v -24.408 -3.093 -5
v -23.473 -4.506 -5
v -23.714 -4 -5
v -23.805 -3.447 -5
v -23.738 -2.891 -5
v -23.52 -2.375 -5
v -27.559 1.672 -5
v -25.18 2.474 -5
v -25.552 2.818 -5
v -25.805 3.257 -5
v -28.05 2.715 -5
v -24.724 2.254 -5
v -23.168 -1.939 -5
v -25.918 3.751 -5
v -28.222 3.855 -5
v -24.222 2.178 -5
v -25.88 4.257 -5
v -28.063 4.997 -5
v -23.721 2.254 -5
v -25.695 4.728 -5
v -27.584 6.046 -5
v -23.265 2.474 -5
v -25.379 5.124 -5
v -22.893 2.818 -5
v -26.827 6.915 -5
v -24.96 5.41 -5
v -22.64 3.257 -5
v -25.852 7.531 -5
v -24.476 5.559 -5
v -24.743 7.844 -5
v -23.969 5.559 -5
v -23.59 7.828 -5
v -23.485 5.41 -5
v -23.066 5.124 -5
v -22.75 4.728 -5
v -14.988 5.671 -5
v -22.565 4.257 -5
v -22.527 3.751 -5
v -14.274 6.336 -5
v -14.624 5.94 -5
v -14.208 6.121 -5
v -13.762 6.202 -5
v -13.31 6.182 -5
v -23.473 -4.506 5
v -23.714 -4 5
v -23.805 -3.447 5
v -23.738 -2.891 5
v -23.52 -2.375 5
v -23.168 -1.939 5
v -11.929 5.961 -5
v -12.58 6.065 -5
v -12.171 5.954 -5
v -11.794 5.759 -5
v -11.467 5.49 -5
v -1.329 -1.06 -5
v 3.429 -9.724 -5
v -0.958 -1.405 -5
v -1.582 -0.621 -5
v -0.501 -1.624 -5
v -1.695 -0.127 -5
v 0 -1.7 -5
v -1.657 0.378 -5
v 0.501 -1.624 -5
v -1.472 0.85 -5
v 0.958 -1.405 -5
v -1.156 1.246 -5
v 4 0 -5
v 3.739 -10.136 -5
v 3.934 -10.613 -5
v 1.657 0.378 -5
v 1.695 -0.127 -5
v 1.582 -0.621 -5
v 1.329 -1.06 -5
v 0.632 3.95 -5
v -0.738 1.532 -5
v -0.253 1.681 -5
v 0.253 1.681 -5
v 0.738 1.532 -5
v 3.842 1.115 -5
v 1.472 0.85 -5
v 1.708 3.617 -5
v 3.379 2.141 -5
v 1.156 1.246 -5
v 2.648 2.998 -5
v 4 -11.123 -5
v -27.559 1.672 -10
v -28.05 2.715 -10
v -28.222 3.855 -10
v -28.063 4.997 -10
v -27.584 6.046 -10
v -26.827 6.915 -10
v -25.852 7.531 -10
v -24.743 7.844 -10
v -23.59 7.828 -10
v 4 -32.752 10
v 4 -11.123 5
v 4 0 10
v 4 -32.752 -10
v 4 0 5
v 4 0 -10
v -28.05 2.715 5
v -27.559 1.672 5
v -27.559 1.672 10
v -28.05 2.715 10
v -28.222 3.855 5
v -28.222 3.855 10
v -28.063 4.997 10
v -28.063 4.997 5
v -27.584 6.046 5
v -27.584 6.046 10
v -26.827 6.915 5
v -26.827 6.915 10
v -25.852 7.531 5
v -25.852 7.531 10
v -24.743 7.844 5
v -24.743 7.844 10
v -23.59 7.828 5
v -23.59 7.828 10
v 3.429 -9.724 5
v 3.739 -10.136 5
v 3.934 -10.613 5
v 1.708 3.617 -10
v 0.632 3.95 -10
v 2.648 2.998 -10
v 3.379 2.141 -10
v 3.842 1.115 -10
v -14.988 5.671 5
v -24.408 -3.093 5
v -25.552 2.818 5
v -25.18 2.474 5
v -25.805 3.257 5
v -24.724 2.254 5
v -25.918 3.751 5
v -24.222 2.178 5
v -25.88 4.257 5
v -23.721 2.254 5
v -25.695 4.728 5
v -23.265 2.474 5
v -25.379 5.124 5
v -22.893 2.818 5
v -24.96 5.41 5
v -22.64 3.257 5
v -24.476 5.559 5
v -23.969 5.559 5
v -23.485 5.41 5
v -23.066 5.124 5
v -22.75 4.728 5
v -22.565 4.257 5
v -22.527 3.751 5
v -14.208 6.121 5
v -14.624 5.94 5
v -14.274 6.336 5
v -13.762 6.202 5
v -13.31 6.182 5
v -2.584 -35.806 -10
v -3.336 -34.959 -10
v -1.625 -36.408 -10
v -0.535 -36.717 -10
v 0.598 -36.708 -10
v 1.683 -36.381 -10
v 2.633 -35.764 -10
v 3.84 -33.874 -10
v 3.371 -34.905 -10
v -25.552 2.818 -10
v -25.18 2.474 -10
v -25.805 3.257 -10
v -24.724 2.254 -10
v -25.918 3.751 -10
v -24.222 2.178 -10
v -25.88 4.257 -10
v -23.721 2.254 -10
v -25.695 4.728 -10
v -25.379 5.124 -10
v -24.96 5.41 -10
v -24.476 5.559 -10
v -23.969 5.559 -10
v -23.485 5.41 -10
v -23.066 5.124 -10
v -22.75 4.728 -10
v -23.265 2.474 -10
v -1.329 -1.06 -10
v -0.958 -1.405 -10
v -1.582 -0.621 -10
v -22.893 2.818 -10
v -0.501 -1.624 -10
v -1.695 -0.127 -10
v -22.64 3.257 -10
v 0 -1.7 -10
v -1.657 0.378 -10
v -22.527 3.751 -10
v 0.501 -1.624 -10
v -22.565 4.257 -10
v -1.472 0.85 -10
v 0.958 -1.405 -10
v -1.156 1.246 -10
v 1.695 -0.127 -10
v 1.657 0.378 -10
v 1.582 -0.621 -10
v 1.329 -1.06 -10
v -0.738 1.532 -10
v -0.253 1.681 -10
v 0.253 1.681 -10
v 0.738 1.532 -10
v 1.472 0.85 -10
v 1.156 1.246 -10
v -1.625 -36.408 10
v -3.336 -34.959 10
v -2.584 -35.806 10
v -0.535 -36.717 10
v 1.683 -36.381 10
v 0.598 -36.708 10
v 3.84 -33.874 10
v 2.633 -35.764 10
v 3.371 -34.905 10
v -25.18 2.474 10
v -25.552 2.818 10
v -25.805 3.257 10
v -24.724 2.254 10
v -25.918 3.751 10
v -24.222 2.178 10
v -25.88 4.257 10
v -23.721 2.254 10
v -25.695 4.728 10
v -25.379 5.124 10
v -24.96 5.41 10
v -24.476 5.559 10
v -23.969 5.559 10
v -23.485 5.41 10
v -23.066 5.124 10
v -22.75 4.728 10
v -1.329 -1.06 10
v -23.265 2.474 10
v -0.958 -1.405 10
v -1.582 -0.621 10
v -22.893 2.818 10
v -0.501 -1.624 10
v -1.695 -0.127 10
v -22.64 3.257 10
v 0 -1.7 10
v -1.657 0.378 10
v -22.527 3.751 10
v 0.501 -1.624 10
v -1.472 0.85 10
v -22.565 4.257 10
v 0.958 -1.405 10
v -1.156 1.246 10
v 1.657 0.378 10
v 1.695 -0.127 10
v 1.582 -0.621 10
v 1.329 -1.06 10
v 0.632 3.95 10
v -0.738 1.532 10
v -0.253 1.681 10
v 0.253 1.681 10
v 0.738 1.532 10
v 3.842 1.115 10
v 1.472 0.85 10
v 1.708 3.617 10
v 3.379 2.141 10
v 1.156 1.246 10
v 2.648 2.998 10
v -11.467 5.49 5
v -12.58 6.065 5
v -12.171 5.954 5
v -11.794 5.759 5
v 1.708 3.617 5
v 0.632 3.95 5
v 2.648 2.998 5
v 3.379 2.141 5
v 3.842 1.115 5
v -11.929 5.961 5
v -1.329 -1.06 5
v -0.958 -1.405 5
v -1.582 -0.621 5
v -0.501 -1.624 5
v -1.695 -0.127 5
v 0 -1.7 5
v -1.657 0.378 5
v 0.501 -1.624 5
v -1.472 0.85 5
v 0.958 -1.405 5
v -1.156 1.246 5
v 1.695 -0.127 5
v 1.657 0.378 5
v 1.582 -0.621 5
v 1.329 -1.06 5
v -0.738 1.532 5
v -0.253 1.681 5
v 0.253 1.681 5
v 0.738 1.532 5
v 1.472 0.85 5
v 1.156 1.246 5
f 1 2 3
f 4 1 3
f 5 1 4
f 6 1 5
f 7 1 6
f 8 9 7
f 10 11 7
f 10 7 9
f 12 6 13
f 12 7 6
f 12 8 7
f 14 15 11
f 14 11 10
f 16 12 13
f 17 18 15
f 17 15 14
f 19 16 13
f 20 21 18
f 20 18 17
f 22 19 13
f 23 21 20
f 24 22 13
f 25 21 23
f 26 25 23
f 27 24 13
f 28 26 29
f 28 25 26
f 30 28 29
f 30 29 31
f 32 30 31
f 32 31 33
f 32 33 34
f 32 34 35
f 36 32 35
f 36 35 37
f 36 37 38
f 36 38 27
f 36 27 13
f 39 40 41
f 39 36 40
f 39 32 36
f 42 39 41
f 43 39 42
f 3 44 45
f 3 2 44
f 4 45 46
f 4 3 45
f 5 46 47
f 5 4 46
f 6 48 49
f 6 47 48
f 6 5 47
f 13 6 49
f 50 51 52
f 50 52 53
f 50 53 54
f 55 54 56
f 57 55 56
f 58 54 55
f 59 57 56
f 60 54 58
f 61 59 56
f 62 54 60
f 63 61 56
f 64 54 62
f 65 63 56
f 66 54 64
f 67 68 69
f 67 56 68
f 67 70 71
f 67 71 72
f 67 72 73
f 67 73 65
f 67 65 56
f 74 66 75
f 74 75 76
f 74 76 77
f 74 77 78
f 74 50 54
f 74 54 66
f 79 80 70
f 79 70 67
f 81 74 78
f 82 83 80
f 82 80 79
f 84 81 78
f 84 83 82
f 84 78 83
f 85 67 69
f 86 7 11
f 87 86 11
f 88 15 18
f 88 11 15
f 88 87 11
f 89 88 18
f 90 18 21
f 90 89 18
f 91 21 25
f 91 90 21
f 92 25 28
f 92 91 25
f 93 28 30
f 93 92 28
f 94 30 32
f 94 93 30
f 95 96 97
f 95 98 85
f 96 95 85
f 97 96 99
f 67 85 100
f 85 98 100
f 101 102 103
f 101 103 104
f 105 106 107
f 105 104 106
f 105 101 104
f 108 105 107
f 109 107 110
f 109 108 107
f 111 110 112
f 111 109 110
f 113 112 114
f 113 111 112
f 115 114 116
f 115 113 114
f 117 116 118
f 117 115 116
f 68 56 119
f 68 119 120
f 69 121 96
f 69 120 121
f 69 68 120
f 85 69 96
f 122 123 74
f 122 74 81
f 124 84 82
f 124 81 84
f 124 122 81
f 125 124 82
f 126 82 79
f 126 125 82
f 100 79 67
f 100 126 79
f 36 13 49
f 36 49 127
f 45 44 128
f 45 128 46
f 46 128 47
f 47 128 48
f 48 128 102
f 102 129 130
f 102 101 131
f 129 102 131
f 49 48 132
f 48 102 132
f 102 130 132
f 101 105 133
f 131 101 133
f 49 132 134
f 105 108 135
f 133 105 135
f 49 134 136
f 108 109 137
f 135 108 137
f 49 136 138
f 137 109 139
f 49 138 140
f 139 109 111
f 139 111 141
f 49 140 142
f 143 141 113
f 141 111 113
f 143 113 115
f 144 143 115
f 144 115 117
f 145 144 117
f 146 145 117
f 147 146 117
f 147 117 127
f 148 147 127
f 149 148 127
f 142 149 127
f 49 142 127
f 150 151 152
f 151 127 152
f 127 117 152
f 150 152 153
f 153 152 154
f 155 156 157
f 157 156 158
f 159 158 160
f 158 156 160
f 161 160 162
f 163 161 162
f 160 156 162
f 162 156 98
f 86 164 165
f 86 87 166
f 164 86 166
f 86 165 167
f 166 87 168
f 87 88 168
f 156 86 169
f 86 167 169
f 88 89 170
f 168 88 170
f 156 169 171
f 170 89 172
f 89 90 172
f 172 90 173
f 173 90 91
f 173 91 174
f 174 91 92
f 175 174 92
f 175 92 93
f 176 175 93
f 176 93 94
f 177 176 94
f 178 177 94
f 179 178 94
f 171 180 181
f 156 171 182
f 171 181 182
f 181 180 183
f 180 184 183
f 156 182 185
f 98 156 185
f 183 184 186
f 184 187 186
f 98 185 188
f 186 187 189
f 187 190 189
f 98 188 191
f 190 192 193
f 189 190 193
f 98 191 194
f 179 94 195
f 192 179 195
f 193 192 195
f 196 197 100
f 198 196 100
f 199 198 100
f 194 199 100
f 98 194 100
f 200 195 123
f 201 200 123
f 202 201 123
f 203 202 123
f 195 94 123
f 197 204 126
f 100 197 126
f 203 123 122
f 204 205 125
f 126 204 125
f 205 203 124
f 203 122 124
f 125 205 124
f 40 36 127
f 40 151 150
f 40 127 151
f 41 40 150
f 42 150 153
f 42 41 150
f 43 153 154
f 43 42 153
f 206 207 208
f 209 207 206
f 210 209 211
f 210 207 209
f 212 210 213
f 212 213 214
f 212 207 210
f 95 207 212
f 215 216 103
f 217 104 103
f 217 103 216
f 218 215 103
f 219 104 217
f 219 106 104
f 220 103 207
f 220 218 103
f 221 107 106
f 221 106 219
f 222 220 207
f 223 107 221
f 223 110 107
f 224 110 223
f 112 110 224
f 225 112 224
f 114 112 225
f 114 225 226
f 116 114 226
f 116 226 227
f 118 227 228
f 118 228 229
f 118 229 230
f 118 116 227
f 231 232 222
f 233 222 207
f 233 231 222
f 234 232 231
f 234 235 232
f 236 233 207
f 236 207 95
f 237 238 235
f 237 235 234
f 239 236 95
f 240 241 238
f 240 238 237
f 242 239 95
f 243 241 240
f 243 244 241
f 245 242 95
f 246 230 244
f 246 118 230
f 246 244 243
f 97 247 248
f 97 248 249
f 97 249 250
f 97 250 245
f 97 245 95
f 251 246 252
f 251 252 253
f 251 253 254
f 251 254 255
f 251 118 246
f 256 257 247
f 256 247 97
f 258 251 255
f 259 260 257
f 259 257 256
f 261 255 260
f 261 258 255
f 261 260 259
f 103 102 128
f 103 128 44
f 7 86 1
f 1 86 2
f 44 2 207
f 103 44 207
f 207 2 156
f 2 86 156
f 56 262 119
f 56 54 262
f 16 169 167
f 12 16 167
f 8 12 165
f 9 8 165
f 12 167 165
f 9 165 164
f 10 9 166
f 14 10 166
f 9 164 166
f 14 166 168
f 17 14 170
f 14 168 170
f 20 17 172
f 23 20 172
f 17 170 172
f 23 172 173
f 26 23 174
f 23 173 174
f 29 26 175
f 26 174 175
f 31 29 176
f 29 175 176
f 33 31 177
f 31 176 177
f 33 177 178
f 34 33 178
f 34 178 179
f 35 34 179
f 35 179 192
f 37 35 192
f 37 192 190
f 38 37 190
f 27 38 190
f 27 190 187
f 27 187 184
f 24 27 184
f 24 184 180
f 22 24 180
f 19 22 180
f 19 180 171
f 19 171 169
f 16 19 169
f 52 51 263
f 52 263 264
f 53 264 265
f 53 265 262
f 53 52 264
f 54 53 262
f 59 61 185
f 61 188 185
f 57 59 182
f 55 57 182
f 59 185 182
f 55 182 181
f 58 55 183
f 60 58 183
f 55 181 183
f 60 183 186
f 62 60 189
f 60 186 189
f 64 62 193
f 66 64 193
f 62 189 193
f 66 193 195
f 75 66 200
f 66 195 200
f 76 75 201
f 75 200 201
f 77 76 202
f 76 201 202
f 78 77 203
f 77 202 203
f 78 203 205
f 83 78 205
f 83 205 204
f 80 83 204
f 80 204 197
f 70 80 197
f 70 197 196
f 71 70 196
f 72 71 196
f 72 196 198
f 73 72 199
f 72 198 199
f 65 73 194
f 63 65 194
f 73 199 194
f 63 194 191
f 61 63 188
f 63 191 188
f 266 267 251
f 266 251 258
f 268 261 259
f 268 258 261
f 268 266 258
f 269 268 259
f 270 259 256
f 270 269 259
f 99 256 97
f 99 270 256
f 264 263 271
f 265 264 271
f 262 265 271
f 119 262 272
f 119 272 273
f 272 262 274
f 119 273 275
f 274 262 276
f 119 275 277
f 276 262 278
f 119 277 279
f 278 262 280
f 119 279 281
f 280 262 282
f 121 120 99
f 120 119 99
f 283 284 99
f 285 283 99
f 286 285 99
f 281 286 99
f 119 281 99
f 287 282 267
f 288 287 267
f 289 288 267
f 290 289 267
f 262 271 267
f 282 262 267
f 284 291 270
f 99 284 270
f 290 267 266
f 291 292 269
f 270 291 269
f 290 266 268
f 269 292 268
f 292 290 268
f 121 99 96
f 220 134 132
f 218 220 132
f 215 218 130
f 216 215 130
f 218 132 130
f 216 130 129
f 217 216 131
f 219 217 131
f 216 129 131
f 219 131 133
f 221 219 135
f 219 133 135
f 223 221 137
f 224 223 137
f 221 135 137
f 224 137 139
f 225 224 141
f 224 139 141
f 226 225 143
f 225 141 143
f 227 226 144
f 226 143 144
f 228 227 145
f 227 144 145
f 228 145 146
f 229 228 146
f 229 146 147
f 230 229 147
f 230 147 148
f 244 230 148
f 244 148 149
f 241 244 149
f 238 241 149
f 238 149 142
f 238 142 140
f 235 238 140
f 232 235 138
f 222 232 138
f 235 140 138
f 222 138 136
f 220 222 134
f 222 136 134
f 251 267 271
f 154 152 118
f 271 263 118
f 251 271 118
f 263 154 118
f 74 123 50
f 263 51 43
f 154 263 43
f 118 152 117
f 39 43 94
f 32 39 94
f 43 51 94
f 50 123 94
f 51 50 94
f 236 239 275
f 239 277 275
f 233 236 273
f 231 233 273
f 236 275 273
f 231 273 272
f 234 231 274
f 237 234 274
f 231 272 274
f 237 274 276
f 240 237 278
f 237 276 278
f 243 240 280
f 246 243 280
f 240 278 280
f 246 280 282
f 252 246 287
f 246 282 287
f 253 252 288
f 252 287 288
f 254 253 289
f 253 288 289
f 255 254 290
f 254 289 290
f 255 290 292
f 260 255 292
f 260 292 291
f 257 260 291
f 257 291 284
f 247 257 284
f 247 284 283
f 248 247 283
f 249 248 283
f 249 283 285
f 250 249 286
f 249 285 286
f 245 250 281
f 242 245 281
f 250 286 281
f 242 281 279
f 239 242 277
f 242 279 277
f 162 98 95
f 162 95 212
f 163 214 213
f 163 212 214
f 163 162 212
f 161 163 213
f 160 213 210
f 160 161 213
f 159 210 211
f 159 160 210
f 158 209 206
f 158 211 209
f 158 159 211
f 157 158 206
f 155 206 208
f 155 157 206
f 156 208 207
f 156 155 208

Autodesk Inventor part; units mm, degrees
ref_plane "YZ Plane" through (0, 0, 0) normal (1, 0, 0) x (0, 1, 0)
ref_plane "XZ Plane" through (0, 0, 0) normal (0, 1, 0) x (-1, 0, 0)
ref_plane "XY Plane" through (0, 0, 0) normal (0, 0, 1) x (1, 0, 0)
sketch "Sketch1" plane through (0, 0, 0) normal (0, 0, 1) x (1, 0, 0)
  line L0 (0, 0) -> (-24.2225, 3.8783) construction
  line L1 (-24.2225, 3.8783) -> (0, -32.7525) construction
  line L2 (0, -32.7525) -> (0, 0) construction
  line L3 (0.6324, 3.9497) -> (-23.5901, 7.828)
  line L4 (-27.559, 1.672) -> (-3.3365, -34.9588)
  line L5 (4, -32.7525) -> (4, 0)
  arc A0 (-23.5901, 7.828) -> (-27.559, 1.672) centre (-24.2225, 3.8783) ccw
  arc A1 (4, 0) -> (0.6324, 3.9497) centre (0, 0) ccw
  arc A2 (-3.3365, -34.9588) -> (4, -32.7525) centre (0, -32.7525) ccw
  dimension "d0" = 32.7525
  dimension "d6" = 24.531
  dimension "d14" = 43.9153
  dimension "d15" = 4
extrude "Extrusion1" add sketch "Sketch1" along normal mid plane 20
sketch "Sketch2" plane through (0, 0, 0) normal (0, 0, 1) x (1, 0, 0)
  arc A0 (-23.5901, 7.828) -> (-27.559, 1.672) centre (-24.2225, 3.8783) ccw construction
  line L0 (-3.3365, -34.9588) -> (-27.559, 1.672) construction
  arc A1 (-3.3365, -34.9588) -> (4, -32.7525) centre (0, -32.7525) ccw construction
  line L1 (4, 0) -> (4, -32.7525) construction
  arc A2 (4, 0) -> (0.6324, 3.9497) centre (0, 0) ccw construction
  line L2 (-23.5901, 7.828) -> (0.6324, 3.9497) construction
  arc A3 (4, 0) -> (0.6324, 3.9497) centre (0, 0) ccw
  line L3 (4, 0) -> (4, -10.3073)
  arc A4 (-3.3365, -34.9588) -> (4, -32.7525) centre (0, -32.7525) ccw construction
  line L4 (-3.3365, -34.9588) -> (-7.3441, -28.8984) construction
  arc A5 (-23.5901, 7.828) -> (-27.559, 1.672) centre (-24.2225, 3.8783) ccw
  line L5 (-23.5901, 7.828) -> (-14.2736, 6.3363)
  line L6 (-24.408, -3.0932) -> (-14.2736, 6.3363)
  line L7 (-11.9287, 5.9609) -> (4, -10.3073)
  line L8 (-7.3441, -28.8984) -> (4, -26.0222) construction
  line L9 (-24.408, -3.0932) -> (-27.559, 1.672)
  line L10 (-7.3441, -28.8984) -> (-24.408, -3.0932) construction
  line L11 (4, -10.3073) -> (4, -26.0222) construction
  line L12 (4, -26.0222) -> (4, -32.7525) construction
  line L13 (-11.9287, 5.9609) -> (0.6324, 3.9497)
  line L14 (-14.2736, 6.3363) -> (-11.9287, 5.9609) construction
extrude "Extrusion2" cut sketch "Sketch2" along normal mid plane 10
fillet "Fillet1" radius 2 4 edges at (4, -10.3073, 0) (-11.9287, 5.9609, 0) (-24.408, -3.0932, 0) (-14.2736, 6.3363, 0)
sketch "Sketch3" plane through (0, 0, 10) normal (0, 0, 1) x (1, 0, 0)
  arc A0 (-23.5901, 7.828) -> (-27.559, 1.672) centre (-24.2225, 3.8783) ccw construction
  arc A1 (-3.3365, -34.9588) -> (4, -32.7525) centre (0, -32.7525) ccw construction
  arc A2 (4, 0) -> (0.6324, 3.9497) centre (0, 0) ccw construction
hole "Hole1" at (-24.2225, 3.8783, 10) at (0, 0, 10) direction (0, 0, -1) diameter 3.4 end through all clearance for "Socket Head Cap Screw" size "M3" standard "Ansi Metric M Profile"
equation "\"d0\" = LengthI"
equation "\"d6\" = LengthG"
equation "\"d14\" = LengthH"
equation "\"LengthI\" = 32.752538"
equation "\"LengthG\" = 24.531041"
equation "\"LengthH\" = 43.915254"
properties part number "GHI"
